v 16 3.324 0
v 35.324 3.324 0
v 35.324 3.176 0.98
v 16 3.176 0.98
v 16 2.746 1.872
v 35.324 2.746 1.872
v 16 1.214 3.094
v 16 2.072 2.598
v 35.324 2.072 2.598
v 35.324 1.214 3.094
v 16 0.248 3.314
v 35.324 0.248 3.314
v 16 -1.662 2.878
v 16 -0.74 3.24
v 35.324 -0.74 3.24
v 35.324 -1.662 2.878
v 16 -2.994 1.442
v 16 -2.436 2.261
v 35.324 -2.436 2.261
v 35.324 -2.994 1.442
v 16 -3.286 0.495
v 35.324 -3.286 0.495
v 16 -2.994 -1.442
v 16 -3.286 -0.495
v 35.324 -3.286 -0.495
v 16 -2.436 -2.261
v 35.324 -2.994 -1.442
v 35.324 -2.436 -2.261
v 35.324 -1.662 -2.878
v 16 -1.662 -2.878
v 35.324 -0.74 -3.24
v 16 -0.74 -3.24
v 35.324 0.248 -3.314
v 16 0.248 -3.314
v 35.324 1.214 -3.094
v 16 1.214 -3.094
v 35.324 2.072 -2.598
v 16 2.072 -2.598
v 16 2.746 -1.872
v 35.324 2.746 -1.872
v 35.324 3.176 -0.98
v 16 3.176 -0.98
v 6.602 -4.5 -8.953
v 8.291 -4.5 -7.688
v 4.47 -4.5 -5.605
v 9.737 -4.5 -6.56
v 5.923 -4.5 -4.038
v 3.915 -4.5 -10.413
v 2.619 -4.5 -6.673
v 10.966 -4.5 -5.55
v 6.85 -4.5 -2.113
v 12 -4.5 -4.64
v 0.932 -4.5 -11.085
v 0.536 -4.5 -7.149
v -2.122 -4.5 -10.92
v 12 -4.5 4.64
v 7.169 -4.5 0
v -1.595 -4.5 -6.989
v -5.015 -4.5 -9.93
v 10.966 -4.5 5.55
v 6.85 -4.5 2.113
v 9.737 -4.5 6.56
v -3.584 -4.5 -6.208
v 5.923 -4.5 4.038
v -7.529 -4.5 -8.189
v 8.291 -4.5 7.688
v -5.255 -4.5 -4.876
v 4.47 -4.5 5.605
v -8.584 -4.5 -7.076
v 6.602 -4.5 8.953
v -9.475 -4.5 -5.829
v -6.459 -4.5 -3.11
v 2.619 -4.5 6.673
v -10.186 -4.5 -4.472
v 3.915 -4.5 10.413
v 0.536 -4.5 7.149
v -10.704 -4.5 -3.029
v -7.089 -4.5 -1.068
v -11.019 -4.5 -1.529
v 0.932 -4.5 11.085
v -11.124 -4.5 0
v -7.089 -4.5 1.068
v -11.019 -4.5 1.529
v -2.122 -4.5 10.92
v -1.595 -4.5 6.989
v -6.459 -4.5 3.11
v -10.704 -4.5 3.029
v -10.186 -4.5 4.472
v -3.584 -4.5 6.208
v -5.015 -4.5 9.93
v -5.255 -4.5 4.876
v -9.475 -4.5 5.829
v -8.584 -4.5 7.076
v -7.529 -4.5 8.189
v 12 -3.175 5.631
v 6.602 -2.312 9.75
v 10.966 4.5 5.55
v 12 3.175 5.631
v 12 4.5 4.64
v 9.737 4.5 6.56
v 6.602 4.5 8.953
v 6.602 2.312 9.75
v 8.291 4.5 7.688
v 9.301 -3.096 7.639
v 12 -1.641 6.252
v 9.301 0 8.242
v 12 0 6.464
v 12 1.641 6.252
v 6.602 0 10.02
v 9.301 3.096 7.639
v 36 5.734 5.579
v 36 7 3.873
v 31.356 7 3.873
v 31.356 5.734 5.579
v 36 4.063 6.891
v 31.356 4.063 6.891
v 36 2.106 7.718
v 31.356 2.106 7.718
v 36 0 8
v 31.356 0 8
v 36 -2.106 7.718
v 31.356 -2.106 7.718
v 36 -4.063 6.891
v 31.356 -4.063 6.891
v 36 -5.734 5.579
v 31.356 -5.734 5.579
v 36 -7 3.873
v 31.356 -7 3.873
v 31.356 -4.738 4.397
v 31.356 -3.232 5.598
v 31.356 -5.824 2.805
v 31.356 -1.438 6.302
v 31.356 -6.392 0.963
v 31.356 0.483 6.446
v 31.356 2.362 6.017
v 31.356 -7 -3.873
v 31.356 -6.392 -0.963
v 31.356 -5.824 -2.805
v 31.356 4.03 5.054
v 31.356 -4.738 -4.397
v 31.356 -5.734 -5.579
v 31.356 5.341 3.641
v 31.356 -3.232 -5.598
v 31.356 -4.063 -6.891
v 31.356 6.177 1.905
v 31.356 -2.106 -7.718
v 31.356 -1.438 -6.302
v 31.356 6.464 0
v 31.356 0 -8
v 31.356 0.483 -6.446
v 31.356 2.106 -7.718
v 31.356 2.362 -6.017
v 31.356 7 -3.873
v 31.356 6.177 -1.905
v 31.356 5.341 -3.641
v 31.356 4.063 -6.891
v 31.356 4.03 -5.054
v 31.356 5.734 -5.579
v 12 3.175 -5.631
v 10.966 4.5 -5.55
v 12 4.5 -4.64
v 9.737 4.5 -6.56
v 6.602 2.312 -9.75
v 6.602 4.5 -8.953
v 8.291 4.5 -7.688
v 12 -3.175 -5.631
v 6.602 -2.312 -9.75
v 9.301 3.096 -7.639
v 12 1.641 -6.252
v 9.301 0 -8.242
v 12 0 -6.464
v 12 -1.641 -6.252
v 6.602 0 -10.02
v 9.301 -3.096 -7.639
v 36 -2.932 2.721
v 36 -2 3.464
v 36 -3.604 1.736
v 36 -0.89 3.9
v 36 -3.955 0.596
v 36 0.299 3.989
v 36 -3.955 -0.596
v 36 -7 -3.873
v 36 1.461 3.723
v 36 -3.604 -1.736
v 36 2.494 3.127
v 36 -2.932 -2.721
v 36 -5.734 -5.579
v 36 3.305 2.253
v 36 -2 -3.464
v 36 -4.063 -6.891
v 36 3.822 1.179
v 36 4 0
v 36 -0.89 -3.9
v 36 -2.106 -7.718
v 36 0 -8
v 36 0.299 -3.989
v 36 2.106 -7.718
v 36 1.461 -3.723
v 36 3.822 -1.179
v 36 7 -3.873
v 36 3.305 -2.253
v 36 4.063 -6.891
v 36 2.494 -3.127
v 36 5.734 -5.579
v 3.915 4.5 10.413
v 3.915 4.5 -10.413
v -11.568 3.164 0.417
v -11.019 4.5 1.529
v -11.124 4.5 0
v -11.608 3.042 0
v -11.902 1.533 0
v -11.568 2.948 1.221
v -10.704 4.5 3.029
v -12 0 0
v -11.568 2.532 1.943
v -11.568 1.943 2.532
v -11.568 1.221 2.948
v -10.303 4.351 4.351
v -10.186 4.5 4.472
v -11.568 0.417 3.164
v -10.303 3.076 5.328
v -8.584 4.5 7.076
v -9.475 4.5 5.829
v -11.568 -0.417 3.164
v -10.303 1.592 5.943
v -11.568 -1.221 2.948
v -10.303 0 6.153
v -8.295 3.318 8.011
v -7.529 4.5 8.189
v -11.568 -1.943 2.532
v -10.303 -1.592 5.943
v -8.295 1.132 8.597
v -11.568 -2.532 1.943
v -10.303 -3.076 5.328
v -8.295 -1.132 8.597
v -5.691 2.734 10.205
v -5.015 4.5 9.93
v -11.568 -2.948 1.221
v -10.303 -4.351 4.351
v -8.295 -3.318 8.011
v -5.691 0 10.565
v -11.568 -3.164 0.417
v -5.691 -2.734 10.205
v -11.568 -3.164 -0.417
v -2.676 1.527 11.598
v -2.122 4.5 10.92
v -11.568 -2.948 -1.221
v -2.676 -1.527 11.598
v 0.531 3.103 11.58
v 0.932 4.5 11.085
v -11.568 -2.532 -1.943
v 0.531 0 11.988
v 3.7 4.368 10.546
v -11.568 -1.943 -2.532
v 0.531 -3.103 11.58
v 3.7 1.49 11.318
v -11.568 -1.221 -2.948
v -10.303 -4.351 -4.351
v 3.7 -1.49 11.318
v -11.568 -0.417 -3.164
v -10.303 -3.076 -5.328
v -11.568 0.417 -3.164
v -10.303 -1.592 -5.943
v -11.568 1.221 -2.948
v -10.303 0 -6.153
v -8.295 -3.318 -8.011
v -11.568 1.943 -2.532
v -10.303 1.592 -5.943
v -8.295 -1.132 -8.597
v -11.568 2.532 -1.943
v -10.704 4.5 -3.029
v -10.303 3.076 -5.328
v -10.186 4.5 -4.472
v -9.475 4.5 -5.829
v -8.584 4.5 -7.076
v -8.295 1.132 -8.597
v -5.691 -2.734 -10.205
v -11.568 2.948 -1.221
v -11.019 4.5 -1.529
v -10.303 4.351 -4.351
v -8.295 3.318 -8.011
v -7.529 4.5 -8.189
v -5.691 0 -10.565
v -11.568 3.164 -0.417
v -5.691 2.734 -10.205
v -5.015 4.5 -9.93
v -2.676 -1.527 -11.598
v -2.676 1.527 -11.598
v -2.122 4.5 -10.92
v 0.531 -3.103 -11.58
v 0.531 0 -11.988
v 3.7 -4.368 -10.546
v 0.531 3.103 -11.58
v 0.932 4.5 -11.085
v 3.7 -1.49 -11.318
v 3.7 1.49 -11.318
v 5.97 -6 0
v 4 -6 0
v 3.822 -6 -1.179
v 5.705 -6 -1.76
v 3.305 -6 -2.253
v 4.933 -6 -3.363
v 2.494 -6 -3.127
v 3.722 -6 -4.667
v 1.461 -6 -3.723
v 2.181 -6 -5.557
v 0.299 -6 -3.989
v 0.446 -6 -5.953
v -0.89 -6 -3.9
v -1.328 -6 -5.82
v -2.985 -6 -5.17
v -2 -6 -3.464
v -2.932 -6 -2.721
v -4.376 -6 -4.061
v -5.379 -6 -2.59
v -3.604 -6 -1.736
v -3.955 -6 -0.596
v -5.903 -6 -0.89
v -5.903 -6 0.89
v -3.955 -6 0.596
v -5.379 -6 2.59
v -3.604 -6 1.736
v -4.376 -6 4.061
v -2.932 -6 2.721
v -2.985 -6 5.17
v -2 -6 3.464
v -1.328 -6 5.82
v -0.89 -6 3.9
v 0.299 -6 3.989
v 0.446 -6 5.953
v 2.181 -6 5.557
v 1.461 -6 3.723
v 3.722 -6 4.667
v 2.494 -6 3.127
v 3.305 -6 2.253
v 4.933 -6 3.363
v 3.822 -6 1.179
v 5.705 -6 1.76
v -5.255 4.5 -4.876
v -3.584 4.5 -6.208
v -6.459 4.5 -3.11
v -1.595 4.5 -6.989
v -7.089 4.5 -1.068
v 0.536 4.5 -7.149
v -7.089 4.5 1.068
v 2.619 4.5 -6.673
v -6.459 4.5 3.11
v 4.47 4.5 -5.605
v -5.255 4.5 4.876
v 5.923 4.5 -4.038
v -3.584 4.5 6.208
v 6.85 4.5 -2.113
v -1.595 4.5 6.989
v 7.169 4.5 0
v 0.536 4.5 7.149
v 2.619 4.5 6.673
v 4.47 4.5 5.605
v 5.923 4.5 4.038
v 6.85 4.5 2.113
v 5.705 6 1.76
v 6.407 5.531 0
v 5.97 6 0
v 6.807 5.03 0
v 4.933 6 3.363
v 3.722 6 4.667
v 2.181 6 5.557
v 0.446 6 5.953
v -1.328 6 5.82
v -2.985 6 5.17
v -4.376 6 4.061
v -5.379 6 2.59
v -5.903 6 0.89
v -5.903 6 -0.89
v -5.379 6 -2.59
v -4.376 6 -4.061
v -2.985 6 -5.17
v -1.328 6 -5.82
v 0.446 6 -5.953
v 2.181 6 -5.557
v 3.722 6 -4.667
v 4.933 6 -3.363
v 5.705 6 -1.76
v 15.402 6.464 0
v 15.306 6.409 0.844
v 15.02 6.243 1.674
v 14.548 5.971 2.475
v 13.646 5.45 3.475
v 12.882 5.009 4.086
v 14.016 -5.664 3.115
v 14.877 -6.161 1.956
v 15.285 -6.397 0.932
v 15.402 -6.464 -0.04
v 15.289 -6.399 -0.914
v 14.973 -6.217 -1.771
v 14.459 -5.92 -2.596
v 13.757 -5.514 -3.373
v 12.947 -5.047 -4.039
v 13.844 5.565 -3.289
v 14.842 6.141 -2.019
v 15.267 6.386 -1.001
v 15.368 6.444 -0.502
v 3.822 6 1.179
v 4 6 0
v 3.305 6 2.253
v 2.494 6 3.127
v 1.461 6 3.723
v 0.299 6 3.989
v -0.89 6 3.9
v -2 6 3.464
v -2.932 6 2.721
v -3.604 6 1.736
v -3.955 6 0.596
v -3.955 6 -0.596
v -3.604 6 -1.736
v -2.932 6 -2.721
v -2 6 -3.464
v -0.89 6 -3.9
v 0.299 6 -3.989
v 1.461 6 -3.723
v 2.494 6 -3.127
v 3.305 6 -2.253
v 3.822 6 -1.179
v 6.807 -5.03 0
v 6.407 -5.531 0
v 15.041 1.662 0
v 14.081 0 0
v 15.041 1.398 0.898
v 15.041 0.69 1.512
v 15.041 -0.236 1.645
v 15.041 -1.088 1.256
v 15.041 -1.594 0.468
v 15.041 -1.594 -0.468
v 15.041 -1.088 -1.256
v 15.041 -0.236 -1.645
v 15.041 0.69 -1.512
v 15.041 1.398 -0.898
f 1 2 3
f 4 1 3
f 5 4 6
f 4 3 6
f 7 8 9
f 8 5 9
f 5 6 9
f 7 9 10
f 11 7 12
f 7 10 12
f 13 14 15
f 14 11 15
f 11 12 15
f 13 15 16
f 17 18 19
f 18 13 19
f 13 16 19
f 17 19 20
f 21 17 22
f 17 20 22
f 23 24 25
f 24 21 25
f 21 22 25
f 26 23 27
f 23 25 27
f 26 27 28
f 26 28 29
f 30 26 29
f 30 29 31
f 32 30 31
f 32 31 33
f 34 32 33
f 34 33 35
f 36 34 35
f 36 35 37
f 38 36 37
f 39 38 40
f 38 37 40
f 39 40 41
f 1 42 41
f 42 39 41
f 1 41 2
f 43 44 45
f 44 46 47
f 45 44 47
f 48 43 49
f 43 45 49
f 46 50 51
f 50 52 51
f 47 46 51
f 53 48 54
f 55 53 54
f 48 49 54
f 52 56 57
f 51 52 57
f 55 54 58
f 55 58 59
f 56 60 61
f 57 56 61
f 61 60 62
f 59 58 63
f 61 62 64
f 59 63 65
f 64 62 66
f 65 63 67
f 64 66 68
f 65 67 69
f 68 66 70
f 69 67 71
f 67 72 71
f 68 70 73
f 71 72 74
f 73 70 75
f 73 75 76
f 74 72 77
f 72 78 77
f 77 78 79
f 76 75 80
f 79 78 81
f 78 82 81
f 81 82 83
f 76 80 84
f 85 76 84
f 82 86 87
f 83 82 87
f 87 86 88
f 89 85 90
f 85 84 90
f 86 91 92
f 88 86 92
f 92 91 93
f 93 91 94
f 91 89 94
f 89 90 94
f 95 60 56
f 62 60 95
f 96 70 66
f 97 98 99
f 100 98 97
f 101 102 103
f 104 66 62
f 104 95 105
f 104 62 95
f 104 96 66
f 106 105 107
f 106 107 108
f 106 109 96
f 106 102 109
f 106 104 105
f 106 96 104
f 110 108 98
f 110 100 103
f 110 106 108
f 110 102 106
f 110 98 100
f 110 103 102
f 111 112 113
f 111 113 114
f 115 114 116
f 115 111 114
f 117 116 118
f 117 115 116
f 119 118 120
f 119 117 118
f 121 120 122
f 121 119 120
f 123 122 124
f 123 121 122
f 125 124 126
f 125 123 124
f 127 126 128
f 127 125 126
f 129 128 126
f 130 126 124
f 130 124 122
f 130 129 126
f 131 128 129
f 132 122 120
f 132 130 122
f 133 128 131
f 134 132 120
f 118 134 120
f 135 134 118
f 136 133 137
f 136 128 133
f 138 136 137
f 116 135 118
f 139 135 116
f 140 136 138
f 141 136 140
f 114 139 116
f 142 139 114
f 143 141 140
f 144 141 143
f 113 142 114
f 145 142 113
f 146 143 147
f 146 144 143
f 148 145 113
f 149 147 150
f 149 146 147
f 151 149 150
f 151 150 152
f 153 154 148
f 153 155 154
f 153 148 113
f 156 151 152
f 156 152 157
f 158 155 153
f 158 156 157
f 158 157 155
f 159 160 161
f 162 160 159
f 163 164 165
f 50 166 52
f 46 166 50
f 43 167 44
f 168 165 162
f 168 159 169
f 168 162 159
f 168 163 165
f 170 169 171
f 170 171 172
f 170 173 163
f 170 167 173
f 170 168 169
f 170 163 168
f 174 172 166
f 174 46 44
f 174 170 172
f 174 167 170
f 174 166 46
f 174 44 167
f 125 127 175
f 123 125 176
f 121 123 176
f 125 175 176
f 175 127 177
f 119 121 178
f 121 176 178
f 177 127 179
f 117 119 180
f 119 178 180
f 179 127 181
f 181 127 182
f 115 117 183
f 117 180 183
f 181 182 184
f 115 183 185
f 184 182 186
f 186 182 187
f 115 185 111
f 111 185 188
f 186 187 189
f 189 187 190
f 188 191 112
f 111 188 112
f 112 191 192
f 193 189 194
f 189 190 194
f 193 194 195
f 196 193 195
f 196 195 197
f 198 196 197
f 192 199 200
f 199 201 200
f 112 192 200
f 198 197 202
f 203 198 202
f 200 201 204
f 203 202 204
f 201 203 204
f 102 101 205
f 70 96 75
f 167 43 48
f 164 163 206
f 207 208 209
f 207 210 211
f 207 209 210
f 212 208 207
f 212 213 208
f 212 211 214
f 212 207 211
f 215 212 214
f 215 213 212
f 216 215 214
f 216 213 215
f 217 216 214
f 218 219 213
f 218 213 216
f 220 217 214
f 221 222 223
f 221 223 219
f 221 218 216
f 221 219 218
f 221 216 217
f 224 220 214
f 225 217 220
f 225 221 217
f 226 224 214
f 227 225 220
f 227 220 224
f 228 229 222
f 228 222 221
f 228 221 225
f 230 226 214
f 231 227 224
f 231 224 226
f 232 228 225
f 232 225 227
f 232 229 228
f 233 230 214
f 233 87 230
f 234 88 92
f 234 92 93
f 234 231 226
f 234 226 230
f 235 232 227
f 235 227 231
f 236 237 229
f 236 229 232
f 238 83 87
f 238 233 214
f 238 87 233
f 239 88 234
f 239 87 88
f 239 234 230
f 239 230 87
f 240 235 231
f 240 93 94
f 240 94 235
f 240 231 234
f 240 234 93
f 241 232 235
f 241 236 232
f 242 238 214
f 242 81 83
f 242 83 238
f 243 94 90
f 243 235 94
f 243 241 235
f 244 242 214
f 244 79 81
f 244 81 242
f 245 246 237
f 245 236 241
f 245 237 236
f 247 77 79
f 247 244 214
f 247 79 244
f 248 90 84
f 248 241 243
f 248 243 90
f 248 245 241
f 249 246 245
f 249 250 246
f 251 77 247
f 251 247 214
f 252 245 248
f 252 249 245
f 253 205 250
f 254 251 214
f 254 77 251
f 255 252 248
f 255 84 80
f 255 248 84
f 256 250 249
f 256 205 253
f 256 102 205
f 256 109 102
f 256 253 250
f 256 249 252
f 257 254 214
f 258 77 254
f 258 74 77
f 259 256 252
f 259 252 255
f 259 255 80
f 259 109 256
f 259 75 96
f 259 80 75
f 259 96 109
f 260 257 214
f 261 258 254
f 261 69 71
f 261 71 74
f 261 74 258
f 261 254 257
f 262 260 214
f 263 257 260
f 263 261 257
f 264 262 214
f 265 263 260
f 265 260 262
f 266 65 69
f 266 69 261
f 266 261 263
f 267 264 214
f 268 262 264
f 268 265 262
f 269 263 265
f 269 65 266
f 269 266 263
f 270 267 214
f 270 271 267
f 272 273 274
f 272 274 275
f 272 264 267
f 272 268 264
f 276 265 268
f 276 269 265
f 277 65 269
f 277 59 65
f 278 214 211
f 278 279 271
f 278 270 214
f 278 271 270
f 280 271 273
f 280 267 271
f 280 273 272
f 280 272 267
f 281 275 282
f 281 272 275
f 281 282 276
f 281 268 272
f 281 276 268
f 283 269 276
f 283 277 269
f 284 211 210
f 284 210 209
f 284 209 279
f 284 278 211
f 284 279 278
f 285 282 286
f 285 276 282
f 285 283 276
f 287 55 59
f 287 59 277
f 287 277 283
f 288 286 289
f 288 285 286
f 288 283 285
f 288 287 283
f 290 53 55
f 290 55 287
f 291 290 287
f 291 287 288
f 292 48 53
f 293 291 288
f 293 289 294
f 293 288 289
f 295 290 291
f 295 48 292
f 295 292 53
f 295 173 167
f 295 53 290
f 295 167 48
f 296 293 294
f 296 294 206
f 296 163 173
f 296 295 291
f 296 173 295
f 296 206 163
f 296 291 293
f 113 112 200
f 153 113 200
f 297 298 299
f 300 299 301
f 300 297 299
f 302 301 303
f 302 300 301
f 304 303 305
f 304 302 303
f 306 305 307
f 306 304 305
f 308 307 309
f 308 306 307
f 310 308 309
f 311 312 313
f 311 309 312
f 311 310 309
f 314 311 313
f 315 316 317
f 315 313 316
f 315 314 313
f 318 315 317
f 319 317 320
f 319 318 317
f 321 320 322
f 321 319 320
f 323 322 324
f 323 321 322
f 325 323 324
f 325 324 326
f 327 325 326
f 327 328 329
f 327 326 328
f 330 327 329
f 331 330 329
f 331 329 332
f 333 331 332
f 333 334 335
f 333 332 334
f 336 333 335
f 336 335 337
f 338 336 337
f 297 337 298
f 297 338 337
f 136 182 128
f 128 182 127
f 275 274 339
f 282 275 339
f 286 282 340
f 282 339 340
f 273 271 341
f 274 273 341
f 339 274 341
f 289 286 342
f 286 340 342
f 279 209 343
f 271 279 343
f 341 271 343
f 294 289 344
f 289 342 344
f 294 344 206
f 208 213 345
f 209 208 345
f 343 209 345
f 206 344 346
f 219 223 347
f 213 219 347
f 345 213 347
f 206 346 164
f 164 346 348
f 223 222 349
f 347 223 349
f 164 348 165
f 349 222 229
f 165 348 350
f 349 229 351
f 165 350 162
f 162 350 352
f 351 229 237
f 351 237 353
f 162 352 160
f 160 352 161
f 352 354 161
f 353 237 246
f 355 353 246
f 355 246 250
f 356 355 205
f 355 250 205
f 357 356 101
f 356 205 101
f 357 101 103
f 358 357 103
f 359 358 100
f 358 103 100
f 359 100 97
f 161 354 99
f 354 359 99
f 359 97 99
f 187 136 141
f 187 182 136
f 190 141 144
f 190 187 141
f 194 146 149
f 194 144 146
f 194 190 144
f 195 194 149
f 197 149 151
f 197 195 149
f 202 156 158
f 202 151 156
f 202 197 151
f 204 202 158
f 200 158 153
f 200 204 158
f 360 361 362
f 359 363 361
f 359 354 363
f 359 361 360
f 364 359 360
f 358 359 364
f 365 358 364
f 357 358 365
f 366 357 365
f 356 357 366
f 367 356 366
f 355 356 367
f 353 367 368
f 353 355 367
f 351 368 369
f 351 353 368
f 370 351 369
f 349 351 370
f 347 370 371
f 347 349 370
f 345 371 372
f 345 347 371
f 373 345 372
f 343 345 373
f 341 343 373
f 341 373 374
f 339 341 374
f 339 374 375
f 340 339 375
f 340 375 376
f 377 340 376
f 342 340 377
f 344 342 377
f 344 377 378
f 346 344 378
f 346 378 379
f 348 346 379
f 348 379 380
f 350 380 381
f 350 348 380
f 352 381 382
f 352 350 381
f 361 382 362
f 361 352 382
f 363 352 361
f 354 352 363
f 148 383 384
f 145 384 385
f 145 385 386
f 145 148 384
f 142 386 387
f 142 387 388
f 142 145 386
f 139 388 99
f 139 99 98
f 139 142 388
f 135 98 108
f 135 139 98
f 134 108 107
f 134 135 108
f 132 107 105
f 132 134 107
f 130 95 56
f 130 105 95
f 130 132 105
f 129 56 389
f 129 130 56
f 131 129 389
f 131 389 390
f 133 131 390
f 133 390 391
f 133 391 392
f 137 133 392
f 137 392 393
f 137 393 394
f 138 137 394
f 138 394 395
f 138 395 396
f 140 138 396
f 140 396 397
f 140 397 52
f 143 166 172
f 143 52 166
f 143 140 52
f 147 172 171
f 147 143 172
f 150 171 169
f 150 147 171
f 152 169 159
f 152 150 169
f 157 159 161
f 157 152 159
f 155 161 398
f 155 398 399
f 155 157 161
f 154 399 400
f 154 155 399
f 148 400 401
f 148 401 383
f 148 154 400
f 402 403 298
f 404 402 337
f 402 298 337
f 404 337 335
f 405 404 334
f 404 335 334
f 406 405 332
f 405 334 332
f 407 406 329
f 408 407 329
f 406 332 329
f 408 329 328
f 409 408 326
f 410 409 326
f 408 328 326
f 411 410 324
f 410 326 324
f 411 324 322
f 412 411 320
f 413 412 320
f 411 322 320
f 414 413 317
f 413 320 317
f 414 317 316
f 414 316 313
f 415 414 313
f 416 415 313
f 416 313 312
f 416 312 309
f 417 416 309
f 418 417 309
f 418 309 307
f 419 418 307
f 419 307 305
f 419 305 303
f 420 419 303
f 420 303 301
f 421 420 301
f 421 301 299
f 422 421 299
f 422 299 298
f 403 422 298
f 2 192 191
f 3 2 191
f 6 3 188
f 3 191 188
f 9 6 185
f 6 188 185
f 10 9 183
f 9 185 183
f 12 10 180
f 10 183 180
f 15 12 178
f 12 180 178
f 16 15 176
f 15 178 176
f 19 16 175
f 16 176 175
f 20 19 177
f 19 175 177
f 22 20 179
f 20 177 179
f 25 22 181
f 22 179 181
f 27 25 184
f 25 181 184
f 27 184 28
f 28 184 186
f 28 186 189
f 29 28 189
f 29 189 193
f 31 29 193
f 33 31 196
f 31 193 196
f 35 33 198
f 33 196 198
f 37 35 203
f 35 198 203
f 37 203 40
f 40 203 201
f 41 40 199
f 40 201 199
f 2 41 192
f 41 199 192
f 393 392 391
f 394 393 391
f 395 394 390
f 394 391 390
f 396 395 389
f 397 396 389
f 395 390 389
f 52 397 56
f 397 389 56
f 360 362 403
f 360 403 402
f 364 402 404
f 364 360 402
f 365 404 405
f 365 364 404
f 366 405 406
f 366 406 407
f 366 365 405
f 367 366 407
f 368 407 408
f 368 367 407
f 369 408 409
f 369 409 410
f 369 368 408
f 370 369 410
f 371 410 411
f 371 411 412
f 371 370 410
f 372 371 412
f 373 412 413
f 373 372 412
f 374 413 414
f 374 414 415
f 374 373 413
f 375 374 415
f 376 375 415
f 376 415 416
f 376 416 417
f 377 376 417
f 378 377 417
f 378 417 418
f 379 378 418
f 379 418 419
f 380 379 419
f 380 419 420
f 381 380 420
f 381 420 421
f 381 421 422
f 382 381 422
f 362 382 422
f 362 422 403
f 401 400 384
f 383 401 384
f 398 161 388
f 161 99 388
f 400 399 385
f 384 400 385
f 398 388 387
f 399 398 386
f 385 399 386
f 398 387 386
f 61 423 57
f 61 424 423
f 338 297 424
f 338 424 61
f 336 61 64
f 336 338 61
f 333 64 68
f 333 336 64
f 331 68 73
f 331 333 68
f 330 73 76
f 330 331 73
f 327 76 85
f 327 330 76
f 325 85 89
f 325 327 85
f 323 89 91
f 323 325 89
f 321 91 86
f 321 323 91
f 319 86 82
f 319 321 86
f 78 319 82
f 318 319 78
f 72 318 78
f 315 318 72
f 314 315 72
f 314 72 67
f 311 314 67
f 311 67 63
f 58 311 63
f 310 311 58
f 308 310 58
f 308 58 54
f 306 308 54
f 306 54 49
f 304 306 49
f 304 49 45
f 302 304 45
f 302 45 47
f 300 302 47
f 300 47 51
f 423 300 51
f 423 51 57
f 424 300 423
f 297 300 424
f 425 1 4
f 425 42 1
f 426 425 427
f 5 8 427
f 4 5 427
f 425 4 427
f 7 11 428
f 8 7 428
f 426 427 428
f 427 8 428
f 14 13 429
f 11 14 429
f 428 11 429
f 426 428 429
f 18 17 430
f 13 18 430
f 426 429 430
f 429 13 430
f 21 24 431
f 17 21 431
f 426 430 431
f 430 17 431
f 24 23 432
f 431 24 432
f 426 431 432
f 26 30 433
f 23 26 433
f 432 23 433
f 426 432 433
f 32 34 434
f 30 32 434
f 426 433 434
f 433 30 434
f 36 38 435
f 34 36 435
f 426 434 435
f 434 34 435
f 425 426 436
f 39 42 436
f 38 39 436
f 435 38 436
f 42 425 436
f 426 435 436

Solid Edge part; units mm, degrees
sketch "Sketch1" plane through (0, 0, 0) normal (0, 0, 1) x (1, 0, 0)
  arc A0 (-12, 0) -> (6.6023, 10.0204) centre (0, 0) cw
  line L0 (6.6023, 10.0204) -> (12, 6.464)
  line L1 (12, 6.464) -> (31.356, 6.464)
  line L2 (31.356, 6.464) -> (31.356, 8)
  line L3 (31.356, 8) -> (36, 8)
  line L4 (36, 8) -> (36, 0)
  line L5 (36, 0) -> (-12, 0)
revolve "RevolvedProtrusion1" add sketch "Sketch1" angle 360 about axis through (36, 0, 0) along (-1, 0, 0)
sketch "Sketch2" plane through (0, 0, 0) normal (0, 0, 1) x (1, 0, 0)
  line L0 (-16, -12.1) -> (25.1636, -12.1)
  line L1 (25.1636, -12.1) -> (12, -4.5)
  line L2 (12, -4.5) -> (-15, -4.5)
  line L3 (-15, -4.5) -> (-15, 4.5)
  line L4 (-15, 4.5) -> (12, 4.5)
  line L5 (12, 4.5) -> (25.1636, 12.1)
  line L6 (25.1636, 12.1) -> (-16, 12.1)
  line L7 (-16, 12.1) -> (-16, -12.1)
extrude "ExtrudedCutout_1" cut sketch "Sketch2" against normal blind 12 and the other way blind 12
sketch "Sketch3" plane through (36, 0, 0) normal (1, 0, 0) x (0, 1, 0)
  line L0 (-14, -14) -> (-7, -14)
  line L1 (-7, -14) -> (-7, 12)
  line L2 (-7, 12) -> (7, 12)
  line L3 (7, 12) -> (7, -14)
  line L4 (7, -14) -> (14, -14)
  line L5 (14, -14) -> (14, 14)
  line L6 (14, 14) -> (-14, 14)
  line L7 (-14, 14) -> (-14, -14)
extrude "ExtrudedCutout_2" cut sketch "Sketch3" against normal blind 16 and the other way blind 16
sketch "Sketch4" plane through (0, 0, 0) normal (0, 0, 1) x (1, 0, 0)
  line L0 (14.0812, 0) -> (16, 3.3235)
  line L1 (16, 3.3235) -> (35.3235, 3.3235)
  line L2 (35.3235, 3.3235) -> (36, 4)
  line L3 (36, 4) -> (36, 0)
  line L4 (36, 0) -> (14.0812, 0)
revolve "RevolvedCutout1" cut sketch "Sketch4" angle 360 about axis through (36, 0, 0) along (-1, 0, 0)
cosmetic_thread "Thread_1" size "M8" thread depth 14.323
sketch "Sketch5" plane through (0, 0, 0) normal (0, 0, 1) x (1, 0, 0)
  line L0 (0, 6) -> (5.9699, 6)
  arc A0 (5.9699, 6) -> (5.9699, -6) centre (0, 0) cw
  line L1 (5.9699, -6) -> (0, -6)
  line L2 (0, -6) -> (0, 6)
revolve "RevolvedProtrusion2" add sketch "Sketch5" angle 360 about axis through (0, -6, 0) along (0, 1, 0)
sketch "Sketch6" plane through (0, 0, 0) normal (0, 0, 1) x (1, 0, 0)
  line L0 (0, 8) -> (4, 8)
  line L1 (4, 8) -> (4, -8)
  line L2 (4, -8) -> (0, -8)
  line L3 (0, -8) -> (0, 8)
revolve "RevolvedCutout2" cut sketch "Sketch6" angle 360 about axis through (0, -8, 0) along (0, 1, 0)
properties part number "195581 CRSGS-M8---(K_0)"
